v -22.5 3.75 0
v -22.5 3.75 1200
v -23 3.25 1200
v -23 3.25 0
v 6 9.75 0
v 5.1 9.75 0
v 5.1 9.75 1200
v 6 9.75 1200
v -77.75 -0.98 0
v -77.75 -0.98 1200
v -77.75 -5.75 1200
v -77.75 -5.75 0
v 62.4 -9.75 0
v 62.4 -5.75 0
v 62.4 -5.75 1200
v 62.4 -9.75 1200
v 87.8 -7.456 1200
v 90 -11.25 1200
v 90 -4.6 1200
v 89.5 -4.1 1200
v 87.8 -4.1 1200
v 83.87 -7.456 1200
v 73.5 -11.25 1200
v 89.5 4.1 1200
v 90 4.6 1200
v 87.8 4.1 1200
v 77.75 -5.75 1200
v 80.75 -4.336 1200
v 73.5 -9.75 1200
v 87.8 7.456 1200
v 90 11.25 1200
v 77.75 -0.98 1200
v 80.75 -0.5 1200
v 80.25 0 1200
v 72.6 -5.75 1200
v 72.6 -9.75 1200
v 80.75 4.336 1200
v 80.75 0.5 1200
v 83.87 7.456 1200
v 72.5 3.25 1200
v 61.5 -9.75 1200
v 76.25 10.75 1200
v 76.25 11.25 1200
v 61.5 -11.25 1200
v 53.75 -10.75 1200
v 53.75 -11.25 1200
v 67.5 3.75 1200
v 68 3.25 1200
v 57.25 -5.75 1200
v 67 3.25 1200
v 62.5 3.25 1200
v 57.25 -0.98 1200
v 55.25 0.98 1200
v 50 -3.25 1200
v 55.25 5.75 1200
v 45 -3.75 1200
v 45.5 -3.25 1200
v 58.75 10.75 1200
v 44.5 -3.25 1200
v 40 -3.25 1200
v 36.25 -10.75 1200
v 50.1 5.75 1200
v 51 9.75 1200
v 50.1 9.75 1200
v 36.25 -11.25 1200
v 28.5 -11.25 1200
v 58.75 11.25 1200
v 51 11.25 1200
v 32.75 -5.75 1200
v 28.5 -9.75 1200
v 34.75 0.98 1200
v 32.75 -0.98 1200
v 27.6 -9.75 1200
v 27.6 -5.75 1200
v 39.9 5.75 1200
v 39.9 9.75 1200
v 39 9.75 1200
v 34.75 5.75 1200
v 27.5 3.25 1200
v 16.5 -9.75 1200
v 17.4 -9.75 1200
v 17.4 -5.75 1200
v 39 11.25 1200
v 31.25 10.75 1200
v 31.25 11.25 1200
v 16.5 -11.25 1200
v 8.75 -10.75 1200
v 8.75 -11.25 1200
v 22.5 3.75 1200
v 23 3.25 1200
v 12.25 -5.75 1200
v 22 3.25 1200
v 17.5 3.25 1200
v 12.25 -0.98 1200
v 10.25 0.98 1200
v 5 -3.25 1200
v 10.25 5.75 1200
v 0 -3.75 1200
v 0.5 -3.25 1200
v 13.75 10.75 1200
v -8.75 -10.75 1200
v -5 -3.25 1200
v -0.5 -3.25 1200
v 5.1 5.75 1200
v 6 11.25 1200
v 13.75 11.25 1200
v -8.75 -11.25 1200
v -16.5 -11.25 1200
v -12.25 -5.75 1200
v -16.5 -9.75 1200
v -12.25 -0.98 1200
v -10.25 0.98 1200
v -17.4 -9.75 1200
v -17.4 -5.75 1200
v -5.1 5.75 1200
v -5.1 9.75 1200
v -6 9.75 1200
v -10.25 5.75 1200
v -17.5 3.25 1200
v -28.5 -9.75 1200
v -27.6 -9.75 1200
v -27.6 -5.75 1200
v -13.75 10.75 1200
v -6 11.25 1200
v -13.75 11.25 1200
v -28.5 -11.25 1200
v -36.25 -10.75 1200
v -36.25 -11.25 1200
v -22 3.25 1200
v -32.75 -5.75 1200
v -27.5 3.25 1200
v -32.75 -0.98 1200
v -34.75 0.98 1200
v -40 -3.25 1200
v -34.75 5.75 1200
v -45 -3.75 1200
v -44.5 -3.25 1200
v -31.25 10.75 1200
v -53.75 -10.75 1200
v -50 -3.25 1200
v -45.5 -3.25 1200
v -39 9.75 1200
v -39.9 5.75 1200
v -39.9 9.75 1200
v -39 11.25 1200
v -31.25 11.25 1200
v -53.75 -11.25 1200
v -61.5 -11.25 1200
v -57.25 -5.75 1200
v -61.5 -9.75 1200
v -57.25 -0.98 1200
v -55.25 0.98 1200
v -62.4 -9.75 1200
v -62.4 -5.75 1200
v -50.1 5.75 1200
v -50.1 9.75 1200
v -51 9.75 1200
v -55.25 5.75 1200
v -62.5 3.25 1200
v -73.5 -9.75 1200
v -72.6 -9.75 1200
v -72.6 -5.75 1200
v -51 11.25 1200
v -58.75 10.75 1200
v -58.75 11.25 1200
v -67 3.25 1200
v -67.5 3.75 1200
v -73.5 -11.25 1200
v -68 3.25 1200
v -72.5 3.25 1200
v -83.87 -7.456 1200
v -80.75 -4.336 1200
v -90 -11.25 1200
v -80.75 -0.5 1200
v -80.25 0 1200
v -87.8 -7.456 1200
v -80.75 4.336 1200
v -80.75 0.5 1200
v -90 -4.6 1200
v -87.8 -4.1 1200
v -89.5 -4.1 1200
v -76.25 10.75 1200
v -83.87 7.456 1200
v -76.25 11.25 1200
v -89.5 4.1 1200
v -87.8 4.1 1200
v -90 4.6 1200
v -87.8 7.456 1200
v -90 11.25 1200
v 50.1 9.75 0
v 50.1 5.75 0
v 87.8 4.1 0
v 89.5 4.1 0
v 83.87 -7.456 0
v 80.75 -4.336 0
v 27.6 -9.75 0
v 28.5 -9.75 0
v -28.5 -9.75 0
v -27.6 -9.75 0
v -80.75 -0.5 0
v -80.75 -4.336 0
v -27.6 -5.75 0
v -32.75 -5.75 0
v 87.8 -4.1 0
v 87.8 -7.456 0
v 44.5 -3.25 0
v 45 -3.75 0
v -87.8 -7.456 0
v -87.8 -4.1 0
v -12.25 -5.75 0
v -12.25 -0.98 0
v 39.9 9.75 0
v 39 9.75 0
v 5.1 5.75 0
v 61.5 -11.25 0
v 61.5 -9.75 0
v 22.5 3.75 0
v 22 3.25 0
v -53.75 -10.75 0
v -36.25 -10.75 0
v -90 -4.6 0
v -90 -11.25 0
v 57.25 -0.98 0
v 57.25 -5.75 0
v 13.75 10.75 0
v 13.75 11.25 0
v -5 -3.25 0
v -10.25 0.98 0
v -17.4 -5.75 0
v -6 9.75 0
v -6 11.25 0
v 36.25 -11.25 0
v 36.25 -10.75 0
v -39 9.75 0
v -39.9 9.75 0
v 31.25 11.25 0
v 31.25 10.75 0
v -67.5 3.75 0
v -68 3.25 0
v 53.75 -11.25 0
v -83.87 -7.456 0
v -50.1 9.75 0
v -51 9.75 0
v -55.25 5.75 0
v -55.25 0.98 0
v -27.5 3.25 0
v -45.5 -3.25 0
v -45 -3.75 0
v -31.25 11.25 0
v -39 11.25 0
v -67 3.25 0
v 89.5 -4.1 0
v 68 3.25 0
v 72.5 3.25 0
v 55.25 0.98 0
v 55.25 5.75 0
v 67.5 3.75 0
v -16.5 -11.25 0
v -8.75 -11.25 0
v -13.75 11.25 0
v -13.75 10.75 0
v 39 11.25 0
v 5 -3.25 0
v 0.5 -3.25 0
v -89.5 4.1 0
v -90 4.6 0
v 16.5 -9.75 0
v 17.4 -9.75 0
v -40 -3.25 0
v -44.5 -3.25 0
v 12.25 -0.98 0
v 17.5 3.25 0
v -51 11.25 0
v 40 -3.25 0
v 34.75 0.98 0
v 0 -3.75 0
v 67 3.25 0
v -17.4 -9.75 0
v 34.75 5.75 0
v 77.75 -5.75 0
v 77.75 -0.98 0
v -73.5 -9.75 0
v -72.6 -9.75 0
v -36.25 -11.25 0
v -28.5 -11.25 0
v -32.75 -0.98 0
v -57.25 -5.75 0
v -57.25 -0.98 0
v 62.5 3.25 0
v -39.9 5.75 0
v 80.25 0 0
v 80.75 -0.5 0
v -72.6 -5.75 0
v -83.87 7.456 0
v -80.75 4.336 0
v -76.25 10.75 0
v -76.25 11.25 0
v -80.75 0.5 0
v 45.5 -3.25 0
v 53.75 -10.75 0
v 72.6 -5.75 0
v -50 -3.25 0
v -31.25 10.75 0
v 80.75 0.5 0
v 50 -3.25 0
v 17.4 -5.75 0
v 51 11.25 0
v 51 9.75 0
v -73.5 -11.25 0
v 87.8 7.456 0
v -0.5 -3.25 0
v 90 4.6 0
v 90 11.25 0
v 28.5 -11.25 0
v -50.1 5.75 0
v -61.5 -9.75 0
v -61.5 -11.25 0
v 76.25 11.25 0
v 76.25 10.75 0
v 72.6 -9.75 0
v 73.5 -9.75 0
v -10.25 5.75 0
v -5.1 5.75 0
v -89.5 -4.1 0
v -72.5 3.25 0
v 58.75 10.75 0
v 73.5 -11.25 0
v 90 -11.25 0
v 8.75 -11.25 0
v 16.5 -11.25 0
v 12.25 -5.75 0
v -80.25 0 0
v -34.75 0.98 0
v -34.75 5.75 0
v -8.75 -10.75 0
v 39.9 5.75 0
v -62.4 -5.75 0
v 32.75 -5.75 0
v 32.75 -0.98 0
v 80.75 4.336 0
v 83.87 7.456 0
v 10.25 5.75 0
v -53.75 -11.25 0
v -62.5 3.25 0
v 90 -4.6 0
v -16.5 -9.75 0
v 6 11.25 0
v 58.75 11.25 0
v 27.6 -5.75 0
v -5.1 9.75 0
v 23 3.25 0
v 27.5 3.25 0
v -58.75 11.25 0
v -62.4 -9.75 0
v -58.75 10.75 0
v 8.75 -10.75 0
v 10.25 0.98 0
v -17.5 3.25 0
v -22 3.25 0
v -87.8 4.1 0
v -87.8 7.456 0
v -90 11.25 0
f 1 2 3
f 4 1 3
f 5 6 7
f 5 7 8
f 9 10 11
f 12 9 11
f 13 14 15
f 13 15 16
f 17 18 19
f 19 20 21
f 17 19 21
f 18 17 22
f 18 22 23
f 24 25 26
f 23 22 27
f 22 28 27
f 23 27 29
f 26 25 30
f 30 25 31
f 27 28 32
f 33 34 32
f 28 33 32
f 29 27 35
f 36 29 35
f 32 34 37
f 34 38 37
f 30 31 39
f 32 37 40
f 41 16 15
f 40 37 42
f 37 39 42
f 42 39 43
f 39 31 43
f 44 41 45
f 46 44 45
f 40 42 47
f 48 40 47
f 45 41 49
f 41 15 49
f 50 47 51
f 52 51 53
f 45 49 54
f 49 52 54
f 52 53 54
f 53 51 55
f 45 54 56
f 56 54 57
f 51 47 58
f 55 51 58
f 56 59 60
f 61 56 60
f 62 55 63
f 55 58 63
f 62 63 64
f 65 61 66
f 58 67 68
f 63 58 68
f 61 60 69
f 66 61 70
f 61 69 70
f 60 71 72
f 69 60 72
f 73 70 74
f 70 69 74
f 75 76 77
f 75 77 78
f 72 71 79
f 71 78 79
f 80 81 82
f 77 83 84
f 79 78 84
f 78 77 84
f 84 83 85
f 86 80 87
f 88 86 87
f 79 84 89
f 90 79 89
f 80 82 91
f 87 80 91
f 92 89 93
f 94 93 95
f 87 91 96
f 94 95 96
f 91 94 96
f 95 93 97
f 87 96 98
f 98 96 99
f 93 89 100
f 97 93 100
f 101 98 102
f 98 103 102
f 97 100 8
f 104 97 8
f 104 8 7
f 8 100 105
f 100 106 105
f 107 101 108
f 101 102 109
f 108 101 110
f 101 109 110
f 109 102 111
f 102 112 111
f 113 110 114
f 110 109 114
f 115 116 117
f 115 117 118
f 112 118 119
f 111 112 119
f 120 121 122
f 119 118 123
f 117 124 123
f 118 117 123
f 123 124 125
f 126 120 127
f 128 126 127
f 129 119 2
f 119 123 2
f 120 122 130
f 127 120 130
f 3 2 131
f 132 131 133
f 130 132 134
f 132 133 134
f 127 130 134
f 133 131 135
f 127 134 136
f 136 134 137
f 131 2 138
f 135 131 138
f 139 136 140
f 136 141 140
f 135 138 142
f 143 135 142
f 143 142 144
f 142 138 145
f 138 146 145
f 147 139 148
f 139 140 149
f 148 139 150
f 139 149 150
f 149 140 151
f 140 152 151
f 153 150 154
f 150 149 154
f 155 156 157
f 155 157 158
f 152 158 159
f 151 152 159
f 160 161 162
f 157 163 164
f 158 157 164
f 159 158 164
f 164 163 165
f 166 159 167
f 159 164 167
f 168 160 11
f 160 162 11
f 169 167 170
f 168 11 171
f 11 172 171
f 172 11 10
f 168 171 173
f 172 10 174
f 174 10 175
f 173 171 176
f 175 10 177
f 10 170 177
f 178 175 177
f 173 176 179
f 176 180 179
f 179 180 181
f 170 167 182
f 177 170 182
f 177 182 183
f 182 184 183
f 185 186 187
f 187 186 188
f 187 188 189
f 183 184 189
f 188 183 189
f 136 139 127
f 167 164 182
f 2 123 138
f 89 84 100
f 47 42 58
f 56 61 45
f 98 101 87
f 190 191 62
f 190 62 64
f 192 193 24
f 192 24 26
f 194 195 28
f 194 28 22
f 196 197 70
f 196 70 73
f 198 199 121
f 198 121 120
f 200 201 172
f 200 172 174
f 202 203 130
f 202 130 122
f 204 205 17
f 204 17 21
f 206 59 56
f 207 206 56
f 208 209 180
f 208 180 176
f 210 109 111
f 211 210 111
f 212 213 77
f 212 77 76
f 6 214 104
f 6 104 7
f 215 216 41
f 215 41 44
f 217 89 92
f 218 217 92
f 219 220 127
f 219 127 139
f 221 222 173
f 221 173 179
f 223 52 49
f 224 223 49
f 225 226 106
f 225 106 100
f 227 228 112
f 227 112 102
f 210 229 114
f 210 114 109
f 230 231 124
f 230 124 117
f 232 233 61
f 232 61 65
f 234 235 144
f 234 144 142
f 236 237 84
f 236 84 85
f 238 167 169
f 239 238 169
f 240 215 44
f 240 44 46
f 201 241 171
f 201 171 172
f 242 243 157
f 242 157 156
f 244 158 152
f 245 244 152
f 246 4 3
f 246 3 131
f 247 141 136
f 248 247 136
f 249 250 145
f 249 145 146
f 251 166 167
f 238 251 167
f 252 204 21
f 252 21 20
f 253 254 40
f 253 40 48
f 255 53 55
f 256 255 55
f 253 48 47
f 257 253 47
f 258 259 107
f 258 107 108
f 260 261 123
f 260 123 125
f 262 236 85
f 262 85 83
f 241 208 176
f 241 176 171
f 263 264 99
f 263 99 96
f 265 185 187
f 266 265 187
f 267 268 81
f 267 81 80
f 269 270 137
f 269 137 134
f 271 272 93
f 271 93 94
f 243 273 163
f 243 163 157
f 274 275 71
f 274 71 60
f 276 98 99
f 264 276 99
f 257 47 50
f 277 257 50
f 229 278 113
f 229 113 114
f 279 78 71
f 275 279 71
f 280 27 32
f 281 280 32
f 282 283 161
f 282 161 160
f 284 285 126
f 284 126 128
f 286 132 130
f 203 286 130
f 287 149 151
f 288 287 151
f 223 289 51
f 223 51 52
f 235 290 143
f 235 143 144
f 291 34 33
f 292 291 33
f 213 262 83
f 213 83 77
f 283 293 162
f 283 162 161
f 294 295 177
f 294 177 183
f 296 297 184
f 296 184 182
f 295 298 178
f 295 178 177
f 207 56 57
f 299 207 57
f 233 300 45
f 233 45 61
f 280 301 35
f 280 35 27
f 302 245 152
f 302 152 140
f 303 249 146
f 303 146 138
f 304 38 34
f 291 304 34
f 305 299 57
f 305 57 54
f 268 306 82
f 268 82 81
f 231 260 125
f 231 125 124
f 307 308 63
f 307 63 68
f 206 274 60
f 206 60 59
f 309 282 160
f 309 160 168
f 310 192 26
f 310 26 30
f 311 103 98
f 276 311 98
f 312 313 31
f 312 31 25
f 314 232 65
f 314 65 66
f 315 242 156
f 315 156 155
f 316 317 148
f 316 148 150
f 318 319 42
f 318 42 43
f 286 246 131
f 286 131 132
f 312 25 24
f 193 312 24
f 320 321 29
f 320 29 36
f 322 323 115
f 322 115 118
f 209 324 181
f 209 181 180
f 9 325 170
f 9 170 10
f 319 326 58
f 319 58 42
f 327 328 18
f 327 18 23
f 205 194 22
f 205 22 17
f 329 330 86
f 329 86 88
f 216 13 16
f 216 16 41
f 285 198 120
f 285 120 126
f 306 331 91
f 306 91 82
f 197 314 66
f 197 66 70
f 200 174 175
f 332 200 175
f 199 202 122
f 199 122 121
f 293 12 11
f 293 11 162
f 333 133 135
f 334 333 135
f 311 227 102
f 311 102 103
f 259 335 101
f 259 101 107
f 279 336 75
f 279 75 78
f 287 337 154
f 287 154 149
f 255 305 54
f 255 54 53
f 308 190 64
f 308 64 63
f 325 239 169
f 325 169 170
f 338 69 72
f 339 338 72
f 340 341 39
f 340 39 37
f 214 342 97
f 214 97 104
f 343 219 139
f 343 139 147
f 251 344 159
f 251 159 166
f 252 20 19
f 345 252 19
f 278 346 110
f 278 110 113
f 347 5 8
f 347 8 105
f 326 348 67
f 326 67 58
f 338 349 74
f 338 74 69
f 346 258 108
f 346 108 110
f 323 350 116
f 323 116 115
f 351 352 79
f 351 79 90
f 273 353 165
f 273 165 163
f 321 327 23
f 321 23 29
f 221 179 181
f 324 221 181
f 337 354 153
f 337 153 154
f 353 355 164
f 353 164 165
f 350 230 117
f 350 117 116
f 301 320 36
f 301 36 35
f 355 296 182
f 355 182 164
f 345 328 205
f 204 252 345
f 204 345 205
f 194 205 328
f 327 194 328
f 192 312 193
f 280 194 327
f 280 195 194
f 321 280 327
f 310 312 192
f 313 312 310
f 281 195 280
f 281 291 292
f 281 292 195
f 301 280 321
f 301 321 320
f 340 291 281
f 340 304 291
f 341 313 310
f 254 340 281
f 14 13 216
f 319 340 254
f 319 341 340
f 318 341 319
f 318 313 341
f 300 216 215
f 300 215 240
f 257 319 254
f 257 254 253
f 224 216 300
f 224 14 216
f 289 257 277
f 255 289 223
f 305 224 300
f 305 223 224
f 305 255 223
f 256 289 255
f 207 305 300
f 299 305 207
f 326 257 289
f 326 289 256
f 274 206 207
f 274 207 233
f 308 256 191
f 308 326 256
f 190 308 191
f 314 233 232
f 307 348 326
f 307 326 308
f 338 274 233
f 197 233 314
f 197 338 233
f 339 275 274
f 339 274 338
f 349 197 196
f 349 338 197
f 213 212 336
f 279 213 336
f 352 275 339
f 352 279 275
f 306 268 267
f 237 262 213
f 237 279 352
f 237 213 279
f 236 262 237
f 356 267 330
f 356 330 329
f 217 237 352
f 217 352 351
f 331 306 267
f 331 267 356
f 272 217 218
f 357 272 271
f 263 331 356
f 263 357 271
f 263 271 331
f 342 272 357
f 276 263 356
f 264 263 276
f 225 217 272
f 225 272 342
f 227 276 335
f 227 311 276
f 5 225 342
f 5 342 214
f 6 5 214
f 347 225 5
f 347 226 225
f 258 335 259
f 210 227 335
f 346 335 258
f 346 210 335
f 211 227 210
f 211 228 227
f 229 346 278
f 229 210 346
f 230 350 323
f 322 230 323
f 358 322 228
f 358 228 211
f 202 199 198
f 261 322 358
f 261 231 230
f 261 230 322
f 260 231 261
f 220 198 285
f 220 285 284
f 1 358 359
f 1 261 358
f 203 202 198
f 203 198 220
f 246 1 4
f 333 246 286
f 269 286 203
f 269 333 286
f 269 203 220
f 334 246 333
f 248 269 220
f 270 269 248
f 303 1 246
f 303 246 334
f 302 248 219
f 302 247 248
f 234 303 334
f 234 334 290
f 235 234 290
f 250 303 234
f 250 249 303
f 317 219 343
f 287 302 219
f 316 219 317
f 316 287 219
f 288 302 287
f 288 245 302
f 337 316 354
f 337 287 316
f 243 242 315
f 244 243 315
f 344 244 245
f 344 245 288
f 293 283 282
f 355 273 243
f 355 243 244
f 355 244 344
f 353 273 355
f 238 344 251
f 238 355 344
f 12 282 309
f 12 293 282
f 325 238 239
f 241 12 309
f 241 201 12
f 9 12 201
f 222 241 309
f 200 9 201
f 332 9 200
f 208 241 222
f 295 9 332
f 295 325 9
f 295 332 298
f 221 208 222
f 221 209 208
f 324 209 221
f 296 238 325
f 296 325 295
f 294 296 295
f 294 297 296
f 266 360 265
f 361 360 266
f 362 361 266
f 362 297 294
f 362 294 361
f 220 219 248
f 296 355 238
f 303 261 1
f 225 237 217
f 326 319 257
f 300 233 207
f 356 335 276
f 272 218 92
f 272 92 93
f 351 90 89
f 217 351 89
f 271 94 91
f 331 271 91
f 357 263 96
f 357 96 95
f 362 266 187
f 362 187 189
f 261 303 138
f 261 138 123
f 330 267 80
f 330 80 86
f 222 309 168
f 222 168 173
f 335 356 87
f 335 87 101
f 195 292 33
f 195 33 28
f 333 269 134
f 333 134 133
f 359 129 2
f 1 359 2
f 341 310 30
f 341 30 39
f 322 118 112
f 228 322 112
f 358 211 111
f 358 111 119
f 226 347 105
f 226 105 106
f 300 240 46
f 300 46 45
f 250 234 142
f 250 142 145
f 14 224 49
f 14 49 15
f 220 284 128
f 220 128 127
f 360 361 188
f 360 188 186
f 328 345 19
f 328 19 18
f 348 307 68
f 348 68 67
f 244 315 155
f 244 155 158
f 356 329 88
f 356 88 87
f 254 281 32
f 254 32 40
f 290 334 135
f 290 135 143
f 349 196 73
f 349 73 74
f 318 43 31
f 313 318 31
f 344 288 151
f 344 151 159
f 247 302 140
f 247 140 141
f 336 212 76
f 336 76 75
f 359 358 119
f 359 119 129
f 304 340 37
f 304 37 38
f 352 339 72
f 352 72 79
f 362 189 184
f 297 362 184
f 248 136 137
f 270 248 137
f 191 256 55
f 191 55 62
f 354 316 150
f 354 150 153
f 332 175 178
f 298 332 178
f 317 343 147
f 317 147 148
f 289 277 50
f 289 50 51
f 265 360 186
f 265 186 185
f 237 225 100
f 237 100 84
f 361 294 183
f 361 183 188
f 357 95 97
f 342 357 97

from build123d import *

# Parameters (mm, degrees)
BOSS_EXTRUDE1_DEPTH = 1200


with BuildPart() as part:
    # Model → Boss-Extrude1 (new body)
    with BuildSketch(Plane.XY):
        Polygon((-16.5, -11.25), (-16.5, -9.75), (-17.4, -9.75), (-17.4, -5.75), (-12.25, -5.75), (-12.25, -0.979898987), (-17.5, 3.25), (-22, 3.25), (-22.5, 3.75), (-23, 3.25), (-27.5, 3.25), (-32.75, -0.979898987), (-32.75, -5.75), (-27.6, -5.75), (-27.6, -9.75), (-28.5, -9.75), (-28.5, -11.25), (-36.25, -11.25), (-36.25, -10.75), (-53.75, -10.75), (-53.75, -11.25), (-61.5, -11.25), (-61.5, -9.75), (-62.4, -9.75), (-62.4, -5.75), (-57.25, -5.75), (-57.25, -0.979898987), (-62.5, 3.25), (-67, 3.25), (-67.5, 3.75), (-68, 3.25), (-72.5, 3.25), (-77.75, -0.979898987), (-77.75, -5.75), (-72.6, -5.75), (-72.6, -9.75), (-73.5, -9.75), (-73.5, -11.25), (-90, -11.25), (-90, -4.6), (-89.5, -4.1), (-87.8, -4.1), (-87.8, -7.456), (-83.870213562, -7.456), (-80.75, -4.335786438), (-80.75, -0.5), (-80.25, 0), (-80.75, 0.5), (-80.75, 4.335786438), (-83.870213562, 7.456), (-87.8, 7.456), (-87.8, 4.1), (-89.5, 4.1), (-90, 4.6), (-90, 11.25), (-76.25, 11.25), (-76.25, 10.75), (-58.75, 10.75), (-58.75, 11.25), (-51, 11.25), (-51, 9.75), (-50.1, 9.75), (-50.1, 5.75), (-55.25, 5.75), (-55.25, 0.979898987), (-50, -3.25), (-45.5, -3.25), (-45, -3.75), (-44.5, -3.25), (-40, -3.25), (-34.75, 0.979898987), (-34.75, 5.75), (-39.9, 5.75), (-39.9, 9.75), (-39, 9.75), (-39, 11.25), (-31.25, 11.25), (-31.25, 10.75), (-13.75, 10.75), (-13.75, 11.25), (-6, 11.25), (-6, 9.75), (-5.1, 9.75), (-5.1, 5.75), (-10.25, 5.75), (-10.25, 0.979898987), (-5, -3.25), (-0.5, -3.25), (0, -3.75), (0.5, -3.25), (5, -3.25), (10.25, 0.979898987), (10.25, 5.75), (5.1, 5.75), (5.1, 9.75), (6, 9.75), (6, 11.25), (13.75, 11.25), (13.75, 10.75), (31.25, 10.75), (31.25, 11.25), (39, 11.25), (39, 9.75), (39.9, 9.75), (39.9, 5.75), (34.75, 5.75), (34.75, 0.979898987), (40, -3.25), (44.5, -3.25), (45, -3.75), (45.5, -3.25), (50, -3.25), (55.25, 0.979898987), (55.25, 5.75), (50.1, 5.75), (50.1, 9.75), (51, 9.75), (51, 11.25), (58.75, 11.25), (58.75, 10.75), (76.25, 10.75), (76.25, 11.25), (90, 11.25), (90, 4.6), (89.5, 4.1), (87.8, 4.1), (87.8, 7.456), (83.870213562, 7.456), (80.75, 4.335786438), (80.75, 0.5), (80.25, 0), (80.75, -0.5), (80.75, -4.335786438), (83.870213562, -7.456), (87.8, -7.456), (87.8, -4.1), (89.5, -4.1), (90, -4.6), (90, -11.25), (73.5, -11.25), (73.5, -9.75), (72.6, -9.75), (72.6, -5.75), (77.75, -5.75), (77.75, -0.979898987), (72.5, 3.25), (68, 3.25), (67.5, 3.75), (67, 3.25), (62.5, 3.25), (57.25, -0.979898987), (57.25, -5.75), (62.4, -5.75), (62.4, -9.75), (61.5, -9.75), (61.5, -11.25), (53.75, -11.25), (53.75, -10.75), (36.25, -10.75), (36.25, -11.25), (28.5, -11.25), (28.5, -9.75), (27.6, -9.75), (27.6, -5.75), (32.75, -5.75), (32.75, -0.979898987), (27.5, 3.25), (23, 3.25), (22.5, 3.75), (22, 3.25), (17.5, 3.25), (12.25, -0.979898987), (12.25, -5.75), (17.4, -5.75), (17.4, -9.75), (16.5, -9.75), (16.5, -11.25), (8.75, -11.25), (8.75, -10.75), (-8.75, -10.75), (-8.75, -11.25), align=None)
    extrude(amount=BOSS_EXTRUDE1_DEPTH)


solid = part.part
